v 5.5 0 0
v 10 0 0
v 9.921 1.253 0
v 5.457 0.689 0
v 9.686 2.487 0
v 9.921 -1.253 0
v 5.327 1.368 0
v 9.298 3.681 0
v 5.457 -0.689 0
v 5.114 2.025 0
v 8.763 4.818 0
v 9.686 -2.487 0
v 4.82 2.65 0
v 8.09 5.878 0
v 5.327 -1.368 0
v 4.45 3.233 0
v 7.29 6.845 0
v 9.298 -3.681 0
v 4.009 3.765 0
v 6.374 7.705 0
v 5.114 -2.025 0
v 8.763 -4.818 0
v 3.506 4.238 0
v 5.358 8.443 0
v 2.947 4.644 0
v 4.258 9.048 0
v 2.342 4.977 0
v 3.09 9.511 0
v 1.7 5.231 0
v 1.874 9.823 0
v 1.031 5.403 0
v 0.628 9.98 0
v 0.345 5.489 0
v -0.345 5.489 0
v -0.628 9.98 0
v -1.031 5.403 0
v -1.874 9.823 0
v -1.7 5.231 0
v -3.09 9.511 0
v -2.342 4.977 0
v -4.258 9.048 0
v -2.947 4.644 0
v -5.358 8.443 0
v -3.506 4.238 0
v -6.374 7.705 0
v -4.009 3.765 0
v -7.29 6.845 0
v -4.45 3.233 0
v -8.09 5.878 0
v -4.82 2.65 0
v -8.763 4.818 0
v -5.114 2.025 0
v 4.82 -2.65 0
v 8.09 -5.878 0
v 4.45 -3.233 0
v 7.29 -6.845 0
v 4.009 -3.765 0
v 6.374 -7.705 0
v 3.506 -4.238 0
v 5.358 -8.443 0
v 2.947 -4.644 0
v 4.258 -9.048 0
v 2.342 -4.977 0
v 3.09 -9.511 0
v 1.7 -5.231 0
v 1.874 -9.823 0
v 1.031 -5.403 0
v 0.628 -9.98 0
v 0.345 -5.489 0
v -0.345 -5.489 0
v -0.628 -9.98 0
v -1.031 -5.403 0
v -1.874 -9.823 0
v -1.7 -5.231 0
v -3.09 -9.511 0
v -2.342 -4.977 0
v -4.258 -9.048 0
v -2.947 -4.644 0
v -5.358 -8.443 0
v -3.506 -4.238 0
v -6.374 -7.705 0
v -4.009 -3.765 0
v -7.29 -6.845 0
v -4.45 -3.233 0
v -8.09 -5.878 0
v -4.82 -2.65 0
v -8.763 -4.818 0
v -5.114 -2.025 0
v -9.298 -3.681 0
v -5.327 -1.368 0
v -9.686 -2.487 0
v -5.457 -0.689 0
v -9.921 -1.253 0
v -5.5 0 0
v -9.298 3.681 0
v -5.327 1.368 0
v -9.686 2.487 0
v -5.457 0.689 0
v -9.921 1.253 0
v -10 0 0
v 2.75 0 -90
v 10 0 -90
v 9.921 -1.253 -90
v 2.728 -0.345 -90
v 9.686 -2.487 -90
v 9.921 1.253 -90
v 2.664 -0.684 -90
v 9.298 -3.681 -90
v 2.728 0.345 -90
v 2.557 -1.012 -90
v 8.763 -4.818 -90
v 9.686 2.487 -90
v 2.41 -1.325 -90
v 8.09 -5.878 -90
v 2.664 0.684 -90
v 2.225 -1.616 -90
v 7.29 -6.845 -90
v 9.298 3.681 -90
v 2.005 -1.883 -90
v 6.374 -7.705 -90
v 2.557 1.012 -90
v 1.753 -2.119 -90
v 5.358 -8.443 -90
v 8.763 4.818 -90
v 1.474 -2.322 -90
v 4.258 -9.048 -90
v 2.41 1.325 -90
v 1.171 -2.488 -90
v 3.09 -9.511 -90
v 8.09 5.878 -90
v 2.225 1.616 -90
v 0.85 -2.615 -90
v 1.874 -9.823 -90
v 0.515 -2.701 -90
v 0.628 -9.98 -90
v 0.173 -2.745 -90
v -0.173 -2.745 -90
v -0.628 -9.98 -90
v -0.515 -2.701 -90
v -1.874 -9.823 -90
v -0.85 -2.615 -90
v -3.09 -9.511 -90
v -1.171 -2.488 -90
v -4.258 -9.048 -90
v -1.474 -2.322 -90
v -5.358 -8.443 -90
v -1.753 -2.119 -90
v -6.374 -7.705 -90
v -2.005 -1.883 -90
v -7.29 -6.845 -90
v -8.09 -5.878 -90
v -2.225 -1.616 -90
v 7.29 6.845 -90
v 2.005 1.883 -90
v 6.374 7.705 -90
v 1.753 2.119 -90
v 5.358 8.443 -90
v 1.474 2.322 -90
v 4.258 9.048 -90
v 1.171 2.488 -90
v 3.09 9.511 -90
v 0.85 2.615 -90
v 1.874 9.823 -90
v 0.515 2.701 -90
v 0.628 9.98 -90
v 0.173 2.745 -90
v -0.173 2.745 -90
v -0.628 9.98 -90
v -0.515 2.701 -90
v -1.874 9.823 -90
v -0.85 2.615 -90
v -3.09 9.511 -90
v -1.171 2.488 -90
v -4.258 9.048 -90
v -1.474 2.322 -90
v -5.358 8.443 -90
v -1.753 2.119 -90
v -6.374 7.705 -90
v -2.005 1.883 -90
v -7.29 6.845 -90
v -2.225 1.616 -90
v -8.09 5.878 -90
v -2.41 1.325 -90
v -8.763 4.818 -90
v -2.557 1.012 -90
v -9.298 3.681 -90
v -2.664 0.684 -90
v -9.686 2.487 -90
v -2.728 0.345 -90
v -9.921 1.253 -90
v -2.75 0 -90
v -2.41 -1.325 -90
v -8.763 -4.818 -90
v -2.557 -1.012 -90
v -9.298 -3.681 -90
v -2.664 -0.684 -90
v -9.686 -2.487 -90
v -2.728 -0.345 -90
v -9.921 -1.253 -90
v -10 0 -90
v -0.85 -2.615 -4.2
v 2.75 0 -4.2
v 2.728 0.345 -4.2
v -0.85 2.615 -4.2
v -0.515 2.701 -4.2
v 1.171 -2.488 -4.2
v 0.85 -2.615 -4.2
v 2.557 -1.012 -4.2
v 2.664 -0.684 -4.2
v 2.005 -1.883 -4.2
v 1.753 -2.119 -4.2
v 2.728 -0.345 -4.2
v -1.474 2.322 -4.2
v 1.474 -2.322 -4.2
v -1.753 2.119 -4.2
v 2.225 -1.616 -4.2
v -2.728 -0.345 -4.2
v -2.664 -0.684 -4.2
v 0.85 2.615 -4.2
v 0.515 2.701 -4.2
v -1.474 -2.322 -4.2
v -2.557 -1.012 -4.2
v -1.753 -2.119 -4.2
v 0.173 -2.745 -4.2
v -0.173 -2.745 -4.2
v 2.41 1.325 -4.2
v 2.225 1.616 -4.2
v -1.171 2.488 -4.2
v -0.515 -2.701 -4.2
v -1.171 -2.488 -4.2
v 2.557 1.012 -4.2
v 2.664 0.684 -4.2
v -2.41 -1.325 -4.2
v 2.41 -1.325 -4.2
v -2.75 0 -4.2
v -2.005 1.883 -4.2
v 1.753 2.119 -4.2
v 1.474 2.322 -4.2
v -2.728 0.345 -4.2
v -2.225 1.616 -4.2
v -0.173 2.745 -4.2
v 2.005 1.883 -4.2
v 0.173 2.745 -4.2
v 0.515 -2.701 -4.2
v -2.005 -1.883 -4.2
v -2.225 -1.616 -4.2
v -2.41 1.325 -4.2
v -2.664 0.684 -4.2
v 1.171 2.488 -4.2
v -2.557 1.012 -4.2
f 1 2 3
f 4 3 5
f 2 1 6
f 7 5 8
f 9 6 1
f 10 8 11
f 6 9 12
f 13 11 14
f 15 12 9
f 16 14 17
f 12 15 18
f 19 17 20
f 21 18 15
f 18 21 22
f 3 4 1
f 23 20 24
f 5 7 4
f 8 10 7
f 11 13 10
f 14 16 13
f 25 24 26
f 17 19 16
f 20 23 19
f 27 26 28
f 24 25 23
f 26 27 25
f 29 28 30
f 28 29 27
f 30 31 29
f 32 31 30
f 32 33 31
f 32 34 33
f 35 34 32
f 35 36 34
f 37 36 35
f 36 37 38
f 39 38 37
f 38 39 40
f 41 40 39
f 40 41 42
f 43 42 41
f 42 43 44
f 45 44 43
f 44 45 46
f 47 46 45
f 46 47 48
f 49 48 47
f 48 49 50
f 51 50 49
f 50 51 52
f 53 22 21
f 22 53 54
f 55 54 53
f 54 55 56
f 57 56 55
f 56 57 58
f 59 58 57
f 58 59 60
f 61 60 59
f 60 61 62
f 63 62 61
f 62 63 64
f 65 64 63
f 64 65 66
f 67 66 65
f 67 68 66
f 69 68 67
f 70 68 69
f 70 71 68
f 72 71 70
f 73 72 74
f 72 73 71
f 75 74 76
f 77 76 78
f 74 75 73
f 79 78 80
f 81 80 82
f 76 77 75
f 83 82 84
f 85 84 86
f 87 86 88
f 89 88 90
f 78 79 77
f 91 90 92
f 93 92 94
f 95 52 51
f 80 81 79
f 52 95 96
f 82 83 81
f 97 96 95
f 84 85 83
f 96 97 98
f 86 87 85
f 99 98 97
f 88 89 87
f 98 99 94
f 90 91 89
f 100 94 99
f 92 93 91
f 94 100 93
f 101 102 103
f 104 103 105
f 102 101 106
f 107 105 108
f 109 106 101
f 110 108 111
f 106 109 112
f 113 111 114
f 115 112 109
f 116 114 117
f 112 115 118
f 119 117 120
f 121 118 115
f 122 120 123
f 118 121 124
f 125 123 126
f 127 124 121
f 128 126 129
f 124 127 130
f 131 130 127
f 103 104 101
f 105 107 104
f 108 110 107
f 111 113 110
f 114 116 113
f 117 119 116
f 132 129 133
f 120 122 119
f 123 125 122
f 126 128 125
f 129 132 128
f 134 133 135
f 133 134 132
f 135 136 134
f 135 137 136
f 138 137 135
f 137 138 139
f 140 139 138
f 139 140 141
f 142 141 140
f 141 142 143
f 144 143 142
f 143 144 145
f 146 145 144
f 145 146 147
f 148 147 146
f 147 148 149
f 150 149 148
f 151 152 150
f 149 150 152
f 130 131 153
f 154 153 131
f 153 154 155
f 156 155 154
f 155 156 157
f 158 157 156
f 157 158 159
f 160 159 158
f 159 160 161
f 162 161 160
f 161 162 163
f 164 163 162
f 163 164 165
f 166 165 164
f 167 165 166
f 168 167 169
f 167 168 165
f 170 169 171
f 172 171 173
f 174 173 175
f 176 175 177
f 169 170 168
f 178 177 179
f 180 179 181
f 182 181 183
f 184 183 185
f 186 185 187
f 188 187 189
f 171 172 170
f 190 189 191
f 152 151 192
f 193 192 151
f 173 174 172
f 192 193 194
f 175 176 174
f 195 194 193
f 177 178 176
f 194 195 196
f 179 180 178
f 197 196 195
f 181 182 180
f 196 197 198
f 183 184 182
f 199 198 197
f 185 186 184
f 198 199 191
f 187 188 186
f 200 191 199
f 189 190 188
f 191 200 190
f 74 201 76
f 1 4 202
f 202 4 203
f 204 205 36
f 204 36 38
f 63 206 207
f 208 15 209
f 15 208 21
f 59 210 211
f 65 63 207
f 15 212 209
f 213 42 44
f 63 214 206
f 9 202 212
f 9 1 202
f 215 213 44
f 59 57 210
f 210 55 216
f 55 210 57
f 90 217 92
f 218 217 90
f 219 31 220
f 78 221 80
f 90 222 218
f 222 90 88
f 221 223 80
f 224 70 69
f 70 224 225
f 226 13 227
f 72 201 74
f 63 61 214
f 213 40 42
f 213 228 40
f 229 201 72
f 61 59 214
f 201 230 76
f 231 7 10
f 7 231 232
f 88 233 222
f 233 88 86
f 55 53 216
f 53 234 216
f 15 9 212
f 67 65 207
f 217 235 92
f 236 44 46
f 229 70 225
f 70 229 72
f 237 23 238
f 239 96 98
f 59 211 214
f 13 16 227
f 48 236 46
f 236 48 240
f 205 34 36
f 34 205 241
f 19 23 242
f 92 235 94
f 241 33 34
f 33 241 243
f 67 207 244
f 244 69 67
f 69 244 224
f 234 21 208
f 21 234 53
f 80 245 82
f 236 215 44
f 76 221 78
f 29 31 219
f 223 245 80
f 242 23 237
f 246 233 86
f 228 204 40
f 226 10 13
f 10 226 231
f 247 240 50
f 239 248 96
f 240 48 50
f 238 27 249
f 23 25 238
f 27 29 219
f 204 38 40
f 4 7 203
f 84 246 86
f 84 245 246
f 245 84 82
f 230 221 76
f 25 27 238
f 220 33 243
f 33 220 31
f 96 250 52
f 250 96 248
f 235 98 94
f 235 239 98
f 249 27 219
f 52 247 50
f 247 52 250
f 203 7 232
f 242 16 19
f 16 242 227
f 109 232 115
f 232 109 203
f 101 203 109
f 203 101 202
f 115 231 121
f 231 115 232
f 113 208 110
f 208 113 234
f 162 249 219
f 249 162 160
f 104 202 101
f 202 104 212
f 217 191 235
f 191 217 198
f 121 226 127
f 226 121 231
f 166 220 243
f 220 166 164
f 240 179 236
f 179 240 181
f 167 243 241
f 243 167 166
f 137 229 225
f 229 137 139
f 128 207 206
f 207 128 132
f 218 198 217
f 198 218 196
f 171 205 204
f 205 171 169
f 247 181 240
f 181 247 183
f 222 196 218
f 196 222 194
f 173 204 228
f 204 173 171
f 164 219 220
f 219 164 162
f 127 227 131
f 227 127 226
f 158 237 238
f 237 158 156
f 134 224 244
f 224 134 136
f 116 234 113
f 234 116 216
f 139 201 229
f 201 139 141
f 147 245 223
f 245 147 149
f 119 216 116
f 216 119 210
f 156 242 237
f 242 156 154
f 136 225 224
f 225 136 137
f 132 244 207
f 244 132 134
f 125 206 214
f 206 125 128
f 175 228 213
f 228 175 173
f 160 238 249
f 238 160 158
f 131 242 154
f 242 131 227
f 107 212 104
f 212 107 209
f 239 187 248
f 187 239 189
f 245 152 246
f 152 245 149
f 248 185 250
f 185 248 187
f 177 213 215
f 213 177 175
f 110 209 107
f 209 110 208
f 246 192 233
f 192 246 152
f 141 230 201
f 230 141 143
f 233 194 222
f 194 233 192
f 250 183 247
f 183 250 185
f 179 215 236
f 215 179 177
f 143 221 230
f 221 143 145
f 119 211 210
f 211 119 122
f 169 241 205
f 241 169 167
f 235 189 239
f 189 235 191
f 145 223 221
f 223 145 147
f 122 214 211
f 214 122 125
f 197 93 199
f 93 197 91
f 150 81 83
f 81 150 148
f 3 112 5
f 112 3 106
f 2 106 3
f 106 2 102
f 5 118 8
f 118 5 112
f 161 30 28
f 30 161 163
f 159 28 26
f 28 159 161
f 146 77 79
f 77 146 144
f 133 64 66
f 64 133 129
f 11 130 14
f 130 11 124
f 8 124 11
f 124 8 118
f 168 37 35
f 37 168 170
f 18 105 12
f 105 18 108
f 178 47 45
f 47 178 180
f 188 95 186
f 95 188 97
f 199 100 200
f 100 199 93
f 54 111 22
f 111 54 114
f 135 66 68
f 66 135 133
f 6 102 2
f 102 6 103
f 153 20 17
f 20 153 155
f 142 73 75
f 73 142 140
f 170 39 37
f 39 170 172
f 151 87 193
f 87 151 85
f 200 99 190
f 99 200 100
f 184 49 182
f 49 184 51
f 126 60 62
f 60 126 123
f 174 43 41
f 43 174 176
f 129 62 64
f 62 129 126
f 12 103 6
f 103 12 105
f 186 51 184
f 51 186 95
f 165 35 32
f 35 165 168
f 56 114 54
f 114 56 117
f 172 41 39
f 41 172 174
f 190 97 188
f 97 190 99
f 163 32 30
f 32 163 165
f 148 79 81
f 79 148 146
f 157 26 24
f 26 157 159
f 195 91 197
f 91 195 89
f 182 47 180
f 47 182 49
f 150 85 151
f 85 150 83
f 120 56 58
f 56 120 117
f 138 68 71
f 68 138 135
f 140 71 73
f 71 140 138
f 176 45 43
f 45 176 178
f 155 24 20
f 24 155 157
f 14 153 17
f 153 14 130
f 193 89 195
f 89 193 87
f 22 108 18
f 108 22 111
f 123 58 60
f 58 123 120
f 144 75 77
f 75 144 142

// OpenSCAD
$fn = 50;


difference() {
	union() {
		translate(v = [0, 0, -90.0000000000]) {
			cylinder(h = 90, r = 10.0000000000);
		}
		cylinder(h = 0, r = 20.0000000000);
	}
	union() {
		translate(v = [0, 0, 0]) {
			rotate(a = [0, 0, 0]) {
				difference() {
					union() {
						#translate(v = [0, 0, -90.0000000000]) {
							cylinder(h = 90, r = 2.2500000000);
						}
						#translate(v = [0, 0, -4.2000000000]) {
							cylinder(h = 4.2000000000, r = 10.0000000000, r1 = 2.7500000000, r2 = 5.5000000000);
						}
						#translate(v = [0, 0, -90.0000000000]) {
							cylinder(h = 90, r = 2.7500000000);
						}
						#translate(v = [0, 0, -90.0000000000]) {
							cylinder(h = 90, r = 2.2500000000);
						}
					}
					union();
				}
			}
		}
	}
}
